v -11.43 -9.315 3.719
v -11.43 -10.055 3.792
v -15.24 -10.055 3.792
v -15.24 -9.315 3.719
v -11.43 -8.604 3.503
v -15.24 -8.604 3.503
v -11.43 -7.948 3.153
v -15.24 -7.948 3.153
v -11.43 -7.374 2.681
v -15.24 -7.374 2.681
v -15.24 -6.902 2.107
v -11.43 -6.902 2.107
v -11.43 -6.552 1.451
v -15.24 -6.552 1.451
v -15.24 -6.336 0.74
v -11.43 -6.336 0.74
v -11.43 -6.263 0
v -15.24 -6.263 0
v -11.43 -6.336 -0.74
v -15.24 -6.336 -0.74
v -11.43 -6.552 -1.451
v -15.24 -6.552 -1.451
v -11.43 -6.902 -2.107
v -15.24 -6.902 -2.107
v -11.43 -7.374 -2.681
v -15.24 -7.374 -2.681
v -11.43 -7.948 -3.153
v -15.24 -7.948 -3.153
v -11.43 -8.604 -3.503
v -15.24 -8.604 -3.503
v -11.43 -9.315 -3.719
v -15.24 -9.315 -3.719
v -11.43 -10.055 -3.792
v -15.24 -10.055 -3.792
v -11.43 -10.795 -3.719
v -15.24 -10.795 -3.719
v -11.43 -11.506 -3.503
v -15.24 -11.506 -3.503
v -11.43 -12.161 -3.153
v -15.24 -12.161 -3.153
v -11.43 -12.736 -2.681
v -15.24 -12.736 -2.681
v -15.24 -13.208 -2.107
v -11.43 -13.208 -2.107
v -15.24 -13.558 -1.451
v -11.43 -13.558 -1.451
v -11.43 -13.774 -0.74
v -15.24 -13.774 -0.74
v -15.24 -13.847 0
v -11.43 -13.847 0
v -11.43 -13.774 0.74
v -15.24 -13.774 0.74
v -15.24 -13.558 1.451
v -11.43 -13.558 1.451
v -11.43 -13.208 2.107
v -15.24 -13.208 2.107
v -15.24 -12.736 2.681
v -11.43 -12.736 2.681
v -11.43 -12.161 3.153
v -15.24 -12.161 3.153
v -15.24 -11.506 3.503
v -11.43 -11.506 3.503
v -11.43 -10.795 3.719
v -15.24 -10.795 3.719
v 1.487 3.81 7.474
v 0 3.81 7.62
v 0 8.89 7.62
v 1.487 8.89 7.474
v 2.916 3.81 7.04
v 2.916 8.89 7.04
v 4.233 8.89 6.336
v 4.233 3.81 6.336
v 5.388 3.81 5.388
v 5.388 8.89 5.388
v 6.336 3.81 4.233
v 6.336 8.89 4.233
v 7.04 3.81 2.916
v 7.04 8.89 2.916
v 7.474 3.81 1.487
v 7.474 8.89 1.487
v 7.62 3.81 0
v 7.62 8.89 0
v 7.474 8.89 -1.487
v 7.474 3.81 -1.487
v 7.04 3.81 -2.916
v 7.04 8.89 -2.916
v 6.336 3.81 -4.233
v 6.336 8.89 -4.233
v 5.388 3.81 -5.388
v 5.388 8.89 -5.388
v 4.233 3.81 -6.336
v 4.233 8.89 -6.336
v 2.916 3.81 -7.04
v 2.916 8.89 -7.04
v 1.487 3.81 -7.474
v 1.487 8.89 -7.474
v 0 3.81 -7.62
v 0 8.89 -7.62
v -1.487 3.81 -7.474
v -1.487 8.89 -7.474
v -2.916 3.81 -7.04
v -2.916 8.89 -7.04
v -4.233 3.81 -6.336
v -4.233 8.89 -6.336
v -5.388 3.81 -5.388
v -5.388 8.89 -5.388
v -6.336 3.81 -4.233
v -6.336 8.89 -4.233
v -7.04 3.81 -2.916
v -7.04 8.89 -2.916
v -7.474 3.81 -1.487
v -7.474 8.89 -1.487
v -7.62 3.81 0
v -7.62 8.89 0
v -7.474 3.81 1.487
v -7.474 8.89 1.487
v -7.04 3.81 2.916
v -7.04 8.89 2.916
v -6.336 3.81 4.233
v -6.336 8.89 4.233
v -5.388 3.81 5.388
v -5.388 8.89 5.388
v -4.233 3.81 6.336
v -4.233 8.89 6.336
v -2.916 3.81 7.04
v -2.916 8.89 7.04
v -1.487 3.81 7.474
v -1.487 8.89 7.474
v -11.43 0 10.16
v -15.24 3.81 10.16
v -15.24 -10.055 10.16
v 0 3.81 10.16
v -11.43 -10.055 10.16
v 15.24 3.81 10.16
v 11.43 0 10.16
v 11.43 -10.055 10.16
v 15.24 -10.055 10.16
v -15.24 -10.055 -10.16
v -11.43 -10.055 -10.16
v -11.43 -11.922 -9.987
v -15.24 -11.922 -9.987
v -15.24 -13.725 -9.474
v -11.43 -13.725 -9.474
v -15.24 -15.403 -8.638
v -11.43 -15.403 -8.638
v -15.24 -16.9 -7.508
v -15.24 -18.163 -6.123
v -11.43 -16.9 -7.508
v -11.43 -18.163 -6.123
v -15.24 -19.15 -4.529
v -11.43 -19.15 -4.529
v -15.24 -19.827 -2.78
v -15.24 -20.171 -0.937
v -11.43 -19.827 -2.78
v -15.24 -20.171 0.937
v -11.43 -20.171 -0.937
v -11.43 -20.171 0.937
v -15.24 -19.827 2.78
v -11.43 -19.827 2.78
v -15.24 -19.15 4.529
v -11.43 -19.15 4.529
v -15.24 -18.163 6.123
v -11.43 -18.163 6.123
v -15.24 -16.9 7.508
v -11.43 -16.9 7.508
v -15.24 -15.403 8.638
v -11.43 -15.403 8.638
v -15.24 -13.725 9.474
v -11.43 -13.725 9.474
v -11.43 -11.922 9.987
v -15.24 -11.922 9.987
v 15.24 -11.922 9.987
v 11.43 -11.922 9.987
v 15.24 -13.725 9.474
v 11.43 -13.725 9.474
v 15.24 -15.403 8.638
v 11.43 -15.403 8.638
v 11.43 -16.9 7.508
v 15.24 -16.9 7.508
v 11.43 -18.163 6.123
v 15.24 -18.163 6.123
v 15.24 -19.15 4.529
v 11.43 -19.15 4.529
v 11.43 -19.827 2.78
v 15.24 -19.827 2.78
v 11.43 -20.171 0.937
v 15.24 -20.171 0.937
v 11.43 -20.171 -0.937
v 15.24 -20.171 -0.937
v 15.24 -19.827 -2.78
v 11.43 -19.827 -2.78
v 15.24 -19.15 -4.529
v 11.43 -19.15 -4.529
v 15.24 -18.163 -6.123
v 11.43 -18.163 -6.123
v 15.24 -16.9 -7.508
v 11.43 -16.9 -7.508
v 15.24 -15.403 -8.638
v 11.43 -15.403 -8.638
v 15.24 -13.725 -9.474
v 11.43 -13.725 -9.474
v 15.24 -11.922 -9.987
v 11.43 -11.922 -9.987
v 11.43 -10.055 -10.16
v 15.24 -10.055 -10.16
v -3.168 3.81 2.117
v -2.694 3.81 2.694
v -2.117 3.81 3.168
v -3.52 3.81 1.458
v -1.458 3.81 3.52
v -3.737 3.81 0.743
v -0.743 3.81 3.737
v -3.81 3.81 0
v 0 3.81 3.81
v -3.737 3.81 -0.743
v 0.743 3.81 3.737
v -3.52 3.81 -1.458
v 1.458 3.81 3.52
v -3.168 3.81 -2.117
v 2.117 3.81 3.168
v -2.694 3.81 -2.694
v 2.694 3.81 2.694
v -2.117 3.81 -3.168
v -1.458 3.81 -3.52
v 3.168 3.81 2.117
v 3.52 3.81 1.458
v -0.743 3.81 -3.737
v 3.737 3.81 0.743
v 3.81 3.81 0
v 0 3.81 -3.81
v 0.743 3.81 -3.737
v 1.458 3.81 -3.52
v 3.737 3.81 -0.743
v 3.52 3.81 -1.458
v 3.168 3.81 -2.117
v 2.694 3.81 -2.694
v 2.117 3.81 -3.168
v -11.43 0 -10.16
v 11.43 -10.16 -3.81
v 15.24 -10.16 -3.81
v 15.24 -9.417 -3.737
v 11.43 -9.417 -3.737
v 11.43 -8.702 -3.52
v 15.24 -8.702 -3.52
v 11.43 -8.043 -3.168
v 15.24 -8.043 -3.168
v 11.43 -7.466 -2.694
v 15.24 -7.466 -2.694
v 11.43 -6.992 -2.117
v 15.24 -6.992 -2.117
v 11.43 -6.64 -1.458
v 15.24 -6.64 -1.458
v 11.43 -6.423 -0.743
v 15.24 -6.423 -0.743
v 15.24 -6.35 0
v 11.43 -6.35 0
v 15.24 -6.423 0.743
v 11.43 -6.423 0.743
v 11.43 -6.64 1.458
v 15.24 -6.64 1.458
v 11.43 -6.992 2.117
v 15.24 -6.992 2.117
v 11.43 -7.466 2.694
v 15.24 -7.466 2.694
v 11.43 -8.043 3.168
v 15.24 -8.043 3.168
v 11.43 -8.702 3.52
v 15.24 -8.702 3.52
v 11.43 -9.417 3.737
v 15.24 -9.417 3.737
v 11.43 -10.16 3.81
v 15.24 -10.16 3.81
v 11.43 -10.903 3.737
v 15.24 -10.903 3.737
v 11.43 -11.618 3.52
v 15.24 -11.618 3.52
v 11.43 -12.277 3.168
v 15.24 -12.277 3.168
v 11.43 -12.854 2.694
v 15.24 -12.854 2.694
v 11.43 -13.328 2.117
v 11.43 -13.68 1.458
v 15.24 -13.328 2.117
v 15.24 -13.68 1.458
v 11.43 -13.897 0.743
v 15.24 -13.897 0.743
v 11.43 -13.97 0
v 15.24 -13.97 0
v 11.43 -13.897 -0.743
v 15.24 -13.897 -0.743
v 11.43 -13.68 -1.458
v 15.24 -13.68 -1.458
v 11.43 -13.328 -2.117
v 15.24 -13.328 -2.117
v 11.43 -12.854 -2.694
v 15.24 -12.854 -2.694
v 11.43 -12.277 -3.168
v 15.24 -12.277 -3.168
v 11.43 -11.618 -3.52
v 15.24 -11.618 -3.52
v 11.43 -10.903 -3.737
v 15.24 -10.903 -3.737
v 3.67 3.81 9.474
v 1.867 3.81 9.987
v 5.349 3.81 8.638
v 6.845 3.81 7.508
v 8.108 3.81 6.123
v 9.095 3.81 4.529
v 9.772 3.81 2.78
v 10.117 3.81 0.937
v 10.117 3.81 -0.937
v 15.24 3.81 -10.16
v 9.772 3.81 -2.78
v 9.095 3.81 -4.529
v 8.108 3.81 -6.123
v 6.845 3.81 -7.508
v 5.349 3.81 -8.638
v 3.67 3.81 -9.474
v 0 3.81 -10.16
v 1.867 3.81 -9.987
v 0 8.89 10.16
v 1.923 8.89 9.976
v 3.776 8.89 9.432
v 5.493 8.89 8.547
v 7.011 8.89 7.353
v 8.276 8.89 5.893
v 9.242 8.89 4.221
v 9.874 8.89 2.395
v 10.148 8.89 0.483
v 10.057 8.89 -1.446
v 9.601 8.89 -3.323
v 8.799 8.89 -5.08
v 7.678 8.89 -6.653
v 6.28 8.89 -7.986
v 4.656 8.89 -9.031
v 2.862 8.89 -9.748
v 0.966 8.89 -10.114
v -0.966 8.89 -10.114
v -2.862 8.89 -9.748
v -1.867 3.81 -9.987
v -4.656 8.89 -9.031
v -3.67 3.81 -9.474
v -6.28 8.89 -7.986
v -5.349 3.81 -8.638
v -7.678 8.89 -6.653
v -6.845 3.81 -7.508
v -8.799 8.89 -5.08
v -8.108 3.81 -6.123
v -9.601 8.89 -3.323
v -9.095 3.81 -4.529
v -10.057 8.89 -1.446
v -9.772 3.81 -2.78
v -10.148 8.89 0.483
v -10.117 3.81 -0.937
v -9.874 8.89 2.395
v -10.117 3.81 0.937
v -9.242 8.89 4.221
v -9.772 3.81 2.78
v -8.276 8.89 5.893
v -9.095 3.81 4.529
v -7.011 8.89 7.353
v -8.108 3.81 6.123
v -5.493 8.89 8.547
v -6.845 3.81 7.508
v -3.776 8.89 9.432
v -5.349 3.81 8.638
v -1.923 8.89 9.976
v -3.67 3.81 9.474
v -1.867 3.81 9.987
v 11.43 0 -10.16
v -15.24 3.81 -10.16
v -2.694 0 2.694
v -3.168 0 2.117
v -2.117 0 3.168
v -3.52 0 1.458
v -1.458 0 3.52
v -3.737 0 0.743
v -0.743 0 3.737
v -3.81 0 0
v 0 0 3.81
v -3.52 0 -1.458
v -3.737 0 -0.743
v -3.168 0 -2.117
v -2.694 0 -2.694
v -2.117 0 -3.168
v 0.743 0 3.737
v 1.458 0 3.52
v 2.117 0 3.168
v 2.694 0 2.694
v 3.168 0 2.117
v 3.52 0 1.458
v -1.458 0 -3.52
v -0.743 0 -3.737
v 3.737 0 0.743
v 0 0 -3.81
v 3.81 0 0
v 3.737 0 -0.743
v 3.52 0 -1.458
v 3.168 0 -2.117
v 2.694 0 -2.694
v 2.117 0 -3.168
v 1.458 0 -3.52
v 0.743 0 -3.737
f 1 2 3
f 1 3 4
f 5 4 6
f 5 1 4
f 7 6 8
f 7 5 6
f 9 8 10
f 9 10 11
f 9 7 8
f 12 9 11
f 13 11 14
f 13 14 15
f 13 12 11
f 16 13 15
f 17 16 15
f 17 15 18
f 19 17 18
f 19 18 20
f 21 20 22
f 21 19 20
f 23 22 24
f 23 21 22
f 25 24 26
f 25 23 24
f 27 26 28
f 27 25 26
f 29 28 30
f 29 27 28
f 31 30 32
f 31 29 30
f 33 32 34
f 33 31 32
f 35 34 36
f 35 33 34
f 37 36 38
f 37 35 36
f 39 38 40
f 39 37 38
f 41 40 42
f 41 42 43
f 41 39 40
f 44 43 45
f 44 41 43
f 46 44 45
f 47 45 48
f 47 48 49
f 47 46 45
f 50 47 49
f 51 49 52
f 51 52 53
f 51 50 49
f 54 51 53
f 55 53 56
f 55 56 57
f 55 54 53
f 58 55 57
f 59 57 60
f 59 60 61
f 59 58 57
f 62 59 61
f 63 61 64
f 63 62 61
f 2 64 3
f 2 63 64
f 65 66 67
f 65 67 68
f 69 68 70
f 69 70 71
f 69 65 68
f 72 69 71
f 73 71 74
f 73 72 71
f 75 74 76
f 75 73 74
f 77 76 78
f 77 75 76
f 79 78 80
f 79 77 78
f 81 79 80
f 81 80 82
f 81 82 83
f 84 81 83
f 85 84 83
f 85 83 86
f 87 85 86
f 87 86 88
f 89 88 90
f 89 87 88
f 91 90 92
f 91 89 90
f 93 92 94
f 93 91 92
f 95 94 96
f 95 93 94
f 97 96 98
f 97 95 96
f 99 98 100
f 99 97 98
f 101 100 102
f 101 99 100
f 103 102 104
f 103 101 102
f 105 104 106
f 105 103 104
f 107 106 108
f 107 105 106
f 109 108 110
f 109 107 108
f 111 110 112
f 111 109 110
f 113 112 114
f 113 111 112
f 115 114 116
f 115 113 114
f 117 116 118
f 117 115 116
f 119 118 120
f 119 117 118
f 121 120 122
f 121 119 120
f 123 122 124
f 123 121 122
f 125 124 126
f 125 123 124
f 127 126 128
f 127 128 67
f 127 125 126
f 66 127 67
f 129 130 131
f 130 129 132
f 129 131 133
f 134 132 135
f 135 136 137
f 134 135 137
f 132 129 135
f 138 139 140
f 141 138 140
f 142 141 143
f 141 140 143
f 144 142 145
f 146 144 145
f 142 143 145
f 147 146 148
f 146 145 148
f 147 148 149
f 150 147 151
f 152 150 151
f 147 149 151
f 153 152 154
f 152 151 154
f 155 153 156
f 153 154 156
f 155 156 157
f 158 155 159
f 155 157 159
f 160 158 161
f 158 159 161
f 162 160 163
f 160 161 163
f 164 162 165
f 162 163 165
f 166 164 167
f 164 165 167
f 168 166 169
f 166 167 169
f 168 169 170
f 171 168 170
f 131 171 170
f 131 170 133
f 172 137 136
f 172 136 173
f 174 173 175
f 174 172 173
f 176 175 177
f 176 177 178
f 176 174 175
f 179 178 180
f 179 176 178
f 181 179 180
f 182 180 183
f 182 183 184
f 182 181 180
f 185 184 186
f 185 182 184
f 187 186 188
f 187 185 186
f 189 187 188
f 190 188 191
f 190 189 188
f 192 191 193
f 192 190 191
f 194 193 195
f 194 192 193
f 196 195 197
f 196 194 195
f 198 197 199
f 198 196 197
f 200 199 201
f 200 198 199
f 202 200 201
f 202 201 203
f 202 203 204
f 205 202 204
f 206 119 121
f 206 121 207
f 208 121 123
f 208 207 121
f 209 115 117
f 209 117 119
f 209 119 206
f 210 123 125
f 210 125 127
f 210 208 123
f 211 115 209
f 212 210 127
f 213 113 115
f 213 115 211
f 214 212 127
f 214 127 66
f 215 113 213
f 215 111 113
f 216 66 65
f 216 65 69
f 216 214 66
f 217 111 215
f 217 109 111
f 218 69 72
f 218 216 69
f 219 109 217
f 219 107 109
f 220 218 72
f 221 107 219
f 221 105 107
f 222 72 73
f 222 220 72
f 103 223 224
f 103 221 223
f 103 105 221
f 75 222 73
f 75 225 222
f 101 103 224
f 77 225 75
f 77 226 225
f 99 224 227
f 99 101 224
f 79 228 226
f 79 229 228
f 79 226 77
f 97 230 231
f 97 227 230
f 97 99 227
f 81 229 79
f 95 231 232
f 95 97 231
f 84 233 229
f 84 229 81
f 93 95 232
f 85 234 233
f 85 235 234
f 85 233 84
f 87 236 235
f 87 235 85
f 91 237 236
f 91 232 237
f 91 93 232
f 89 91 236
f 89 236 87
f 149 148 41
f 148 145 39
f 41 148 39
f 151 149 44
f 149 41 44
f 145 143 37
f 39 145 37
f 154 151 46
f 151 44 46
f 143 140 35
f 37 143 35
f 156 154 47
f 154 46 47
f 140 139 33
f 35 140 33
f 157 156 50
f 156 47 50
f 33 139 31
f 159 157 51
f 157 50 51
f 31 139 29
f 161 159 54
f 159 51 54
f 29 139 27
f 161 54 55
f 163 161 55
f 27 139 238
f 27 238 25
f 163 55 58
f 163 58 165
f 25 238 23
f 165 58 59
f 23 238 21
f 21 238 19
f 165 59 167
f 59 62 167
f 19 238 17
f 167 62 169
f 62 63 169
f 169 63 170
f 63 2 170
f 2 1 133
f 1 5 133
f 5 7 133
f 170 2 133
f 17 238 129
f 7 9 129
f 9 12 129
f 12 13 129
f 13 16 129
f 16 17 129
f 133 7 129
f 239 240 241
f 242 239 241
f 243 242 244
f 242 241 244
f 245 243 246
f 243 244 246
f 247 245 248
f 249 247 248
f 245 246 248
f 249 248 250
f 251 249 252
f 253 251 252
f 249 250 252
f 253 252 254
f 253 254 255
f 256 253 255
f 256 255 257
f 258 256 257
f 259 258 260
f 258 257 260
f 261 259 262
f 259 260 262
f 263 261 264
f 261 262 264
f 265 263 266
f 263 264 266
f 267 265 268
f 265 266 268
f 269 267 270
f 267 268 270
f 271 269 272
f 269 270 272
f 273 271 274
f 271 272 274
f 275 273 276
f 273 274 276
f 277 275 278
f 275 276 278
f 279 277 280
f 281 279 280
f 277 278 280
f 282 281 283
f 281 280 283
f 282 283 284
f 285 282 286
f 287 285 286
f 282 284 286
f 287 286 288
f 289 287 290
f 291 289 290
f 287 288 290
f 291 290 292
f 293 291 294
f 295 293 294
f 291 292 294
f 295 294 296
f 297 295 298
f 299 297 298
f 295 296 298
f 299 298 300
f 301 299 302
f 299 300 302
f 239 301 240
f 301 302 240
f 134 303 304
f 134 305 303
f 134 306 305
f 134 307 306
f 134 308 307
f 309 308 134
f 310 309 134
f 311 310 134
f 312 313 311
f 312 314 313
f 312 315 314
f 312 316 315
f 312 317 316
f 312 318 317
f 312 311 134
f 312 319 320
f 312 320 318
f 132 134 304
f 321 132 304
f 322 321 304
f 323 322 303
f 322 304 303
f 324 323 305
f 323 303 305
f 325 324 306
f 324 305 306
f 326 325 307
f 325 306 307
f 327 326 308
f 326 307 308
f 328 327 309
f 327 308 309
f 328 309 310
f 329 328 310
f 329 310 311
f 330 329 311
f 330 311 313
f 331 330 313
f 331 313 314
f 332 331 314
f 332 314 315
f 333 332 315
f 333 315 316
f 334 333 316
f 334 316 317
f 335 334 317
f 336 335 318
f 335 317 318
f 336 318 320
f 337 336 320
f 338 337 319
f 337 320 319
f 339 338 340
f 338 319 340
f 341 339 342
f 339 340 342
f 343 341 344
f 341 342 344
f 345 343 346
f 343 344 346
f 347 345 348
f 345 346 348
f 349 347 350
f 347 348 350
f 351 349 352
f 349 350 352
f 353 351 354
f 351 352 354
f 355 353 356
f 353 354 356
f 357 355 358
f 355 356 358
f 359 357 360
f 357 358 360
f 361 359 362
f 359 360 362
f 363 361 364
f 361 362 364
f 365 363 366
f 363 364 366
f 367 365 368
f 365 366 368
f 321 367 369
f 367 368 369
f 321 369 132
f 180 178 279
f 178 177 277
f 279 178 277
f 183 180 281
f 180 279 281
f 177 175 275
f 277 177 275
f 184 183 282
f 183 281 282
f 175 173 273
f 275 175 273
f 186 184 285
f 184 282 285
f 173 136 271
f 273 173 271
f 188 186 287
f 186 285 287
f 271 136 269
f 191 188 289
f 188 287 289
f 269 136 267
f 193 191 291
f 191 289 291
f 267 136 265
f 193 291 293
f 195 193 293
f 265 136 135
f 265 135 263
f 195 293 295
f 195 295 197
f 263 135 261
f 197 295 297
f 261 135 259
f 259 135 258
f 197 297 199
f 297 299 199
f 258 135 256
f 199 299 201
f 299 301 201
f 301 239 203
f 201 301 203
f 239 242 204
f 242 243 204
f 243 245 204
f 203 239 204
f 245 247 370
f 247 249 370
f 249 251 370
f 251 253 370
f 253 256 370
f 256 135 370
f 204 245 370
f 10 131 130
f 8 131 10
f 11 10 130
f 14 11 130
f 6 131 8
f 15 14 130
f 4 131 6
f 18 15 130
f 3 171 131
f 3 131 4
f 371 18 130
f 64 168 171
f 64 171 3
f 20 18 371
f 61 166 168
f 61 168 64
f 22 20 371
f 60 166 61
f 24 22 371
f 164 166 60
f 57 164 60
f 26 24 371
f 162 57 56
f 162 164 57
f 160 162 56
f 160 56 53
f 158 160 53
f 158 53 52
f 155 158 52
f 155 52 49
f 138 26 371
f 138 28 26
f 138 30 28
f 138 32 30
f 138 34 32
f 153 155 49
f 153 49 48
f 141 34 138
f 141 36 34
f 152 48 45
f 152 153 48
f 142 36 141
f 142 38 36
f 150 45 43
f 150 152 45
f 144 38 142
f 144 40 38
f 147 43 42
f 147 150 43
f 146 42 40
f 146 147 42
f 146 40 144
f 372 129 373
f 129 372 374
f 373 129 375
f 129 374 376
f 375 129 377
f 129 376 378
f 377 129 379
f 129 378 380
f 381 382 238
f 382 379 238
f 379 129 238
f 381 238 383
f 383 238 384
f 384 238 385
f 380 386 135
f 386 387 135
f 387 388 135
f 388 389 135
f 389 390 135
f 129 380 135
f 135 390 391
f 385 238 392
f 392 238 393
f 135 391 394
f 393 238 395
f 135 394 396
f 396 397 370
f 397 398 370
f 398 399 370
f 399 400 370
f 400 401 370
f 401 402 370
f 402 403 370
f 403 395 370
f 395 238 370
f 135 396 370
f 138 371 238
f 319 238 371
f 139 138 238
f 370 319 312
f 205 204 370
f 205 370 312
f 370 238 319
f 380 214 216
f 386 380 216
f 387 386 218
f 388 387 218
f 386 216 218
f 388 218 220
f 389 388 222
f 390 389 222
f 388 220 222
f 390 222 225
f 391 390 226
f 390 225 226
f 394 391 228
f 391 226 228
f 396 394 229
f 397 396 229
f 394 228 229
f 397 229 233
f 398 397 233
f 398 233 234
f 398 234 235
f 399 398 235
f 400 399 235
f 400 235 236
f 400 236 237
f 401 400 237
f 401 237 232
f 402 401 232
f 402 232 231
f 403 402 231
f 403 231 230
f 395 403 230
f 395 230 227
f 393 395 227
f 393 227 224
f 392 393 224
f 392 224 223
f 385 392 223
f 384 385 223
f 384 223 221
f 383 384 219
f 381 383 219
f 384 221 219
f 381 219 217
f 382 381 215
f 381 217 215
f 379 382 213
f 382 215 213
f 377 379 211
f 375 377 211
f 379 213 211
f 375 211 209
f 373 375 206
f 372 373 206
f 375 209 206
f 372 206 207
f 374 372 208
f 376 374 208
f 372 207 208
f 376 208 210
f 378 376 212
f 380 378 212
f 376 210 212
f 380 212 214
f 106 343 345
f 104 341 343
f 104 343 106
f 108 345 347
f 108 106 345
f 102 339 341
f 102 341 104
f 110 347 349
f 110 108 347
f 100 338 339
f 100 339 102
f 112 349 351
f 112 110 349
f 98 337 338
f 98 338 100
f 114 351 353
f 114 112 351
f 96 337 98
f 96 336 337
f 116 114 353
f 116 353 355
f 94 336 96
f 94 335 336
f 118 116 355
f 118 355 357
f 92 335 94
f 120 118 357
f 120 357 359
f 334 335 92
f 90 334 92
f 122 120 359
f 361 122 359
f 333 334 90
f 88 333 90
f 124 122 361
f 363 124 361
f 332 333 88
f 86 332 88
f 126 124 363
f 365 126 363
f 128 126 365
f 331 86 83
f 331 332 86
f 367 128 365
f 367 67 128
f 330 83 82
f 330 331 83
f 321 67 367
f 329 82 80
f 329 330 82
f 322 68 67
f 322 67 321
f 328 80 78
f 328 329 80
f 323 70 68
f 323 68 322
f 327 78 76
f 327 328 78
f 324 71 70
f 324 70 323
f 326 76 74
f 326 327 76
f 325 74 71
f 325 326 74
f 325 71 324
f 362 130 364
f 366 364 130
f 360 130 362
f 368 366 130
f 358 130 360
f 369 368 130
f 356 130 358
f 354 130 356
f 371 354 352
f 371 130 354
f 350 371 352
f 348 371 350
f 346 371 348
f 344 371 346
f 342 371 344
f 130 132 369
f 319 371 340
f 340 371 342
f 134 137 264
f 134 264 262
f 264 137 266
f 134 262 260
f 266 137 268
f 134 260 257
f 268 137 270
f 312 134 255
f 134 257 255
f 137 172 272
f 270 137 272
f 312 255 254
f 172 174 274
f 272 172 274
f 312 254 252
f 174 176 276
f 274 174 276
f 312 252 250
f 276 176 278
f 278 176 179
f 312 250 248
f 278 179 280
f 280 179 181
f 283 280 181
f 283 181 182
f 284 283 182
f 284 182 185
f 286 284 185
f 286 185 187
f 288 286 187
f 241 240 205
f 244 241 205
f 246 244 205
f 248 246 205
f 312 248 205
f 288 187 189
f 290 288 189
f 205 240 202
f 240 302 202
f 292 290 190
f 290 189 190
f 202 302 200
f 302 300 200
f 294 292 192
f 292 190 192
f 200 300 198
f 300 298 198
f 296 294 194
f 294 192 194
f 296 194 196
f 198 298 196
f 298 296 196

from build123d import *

# Parameters (mm, degrees)
SKETCH2_W           = 30.48
SKETCH2_H           = 20.32
BOSS_EXTRUDE1_DEPTH = 3.81
SKETCH3_R           = 10.16
SKETCH3_R_2         = 7.62
BOSS_EXTRUDE2_DEPTH = 5.08
SKETCH4_R           = 3.81
CUT_EXTRUDE1_DEPTH  = 20.007619525
BOSS_EXTRUDE3_DEPTH = 3.81
SKETCH11_R          = 3.81
CUT_EXTRUDE3_DEPTH  = 3.81
BOSS_EXTRUDE5_START = -3.81
SKETCH12_R          = 3.791845508
BOSS_EXTRUDE5_DEPTH = 3.81


with BuildPart() as part:
    # Sketch2 → Boss-Extrude1 (new body)
    with BuildSketch(Plane(origin=(0, 0, 0), x_dir=(1, 0, 0), z_dir=(0, 1, 0))):
        Rectangle(SKETCH2_W, SKETCH2_H)
    extrude(amount=BOSS_EXTRUDE1_DEPTH)

    # Sketch3 → Boss-Extrude2 (add)
    with BuildSketch(Plane(origin=(0, 3.81, 0), x_dir=(1, 0, 0), z_dir=(0, 1, 0))):
        with Locations(Location((0, 0, 0), (0, 0, 270))):
            Circle(SKETCH3_R)
        with Locations(Location((0, 0, 0), (0, 0, 270))):
            Circle(SKETCH3_R_2, mode=Mode.SUBTRACT)
    extrude(amount=BOSS_EXTRUDE2_DEPTH)

    # Sketch4 → Cut-Extrude1 (cut, through all)
    with BuildSketch(Plane(origin=(0, 3.81, 0), x_dir=(1, 0, 0), z_dir=(0, 1, 0))):
        with Locations(Location((0, 0, 0), (0, 0, 270))):
            Circle(SKETCH4_R)
    extrude(amount=-CUT_EXTRUDE1_DEPTH, mode=Mode.SUBTRACT)

    # Sketch6 → Boss-Extrude3 (add)
    with BuildSketch(Plane(origin=(15.24, 0, 0), x_dir=(0, 0, -1), z_dir=(1, 0, 0))):
        with BuildLine():
            Line((-10.16, 3.81), (-10.16, -10.054809762))
            ThreePointArc((-10.16, -10.054809762), (0, -20.214809762), (10.16, -10.054809762))
            Line((10.16, -10.054809762), (10.16, 3.81))
            Line((10.16, 3.81), (-10.16, 3.81))
        make_face()
    extrude(amount=-BOSS_EXTRUDE3_DEPTH)

    # Sketch11 → Cut-Extrude3 (cut)
    with BuildSketch(Plane(origin=(15.24, 0, 0), x_dir=(0, 0, -1), z_dir=(1, 0, 0))):
        with Locations((0, -10.16)):
            Circle(SKETCH11_R)
    extrude(amount=-CUT_EXTRUDE3_DEPTH, mode=Mode.SUBTRACT)

    # Sketch12 → Boss-Extrude5 (add)
    with BuildSketch(Plane.ZY.offset(15.24).offset(BOSS_EXTRUDE5_START)):
        with BuildLine():
            Line((-10.16, 3.81), (-10.16, -10.054809762))
            ThreePointArc((-10.16, -10.054809762), (0, -20.214809762), (10.16, -10.054809762))
            Line((10.16, -10.054809762), (10.16, 3.81))
            Line((10.16, 3.81), (-10.16, 3.81))
        make_face()
        with Locations((0, -10.054809762)):
            Circle(SKETCH12_R, mode=Mode.SUBTRACT)
    extrude(amount=BOSS_EXTRUDE5_DEPTH)


solid = part.part
